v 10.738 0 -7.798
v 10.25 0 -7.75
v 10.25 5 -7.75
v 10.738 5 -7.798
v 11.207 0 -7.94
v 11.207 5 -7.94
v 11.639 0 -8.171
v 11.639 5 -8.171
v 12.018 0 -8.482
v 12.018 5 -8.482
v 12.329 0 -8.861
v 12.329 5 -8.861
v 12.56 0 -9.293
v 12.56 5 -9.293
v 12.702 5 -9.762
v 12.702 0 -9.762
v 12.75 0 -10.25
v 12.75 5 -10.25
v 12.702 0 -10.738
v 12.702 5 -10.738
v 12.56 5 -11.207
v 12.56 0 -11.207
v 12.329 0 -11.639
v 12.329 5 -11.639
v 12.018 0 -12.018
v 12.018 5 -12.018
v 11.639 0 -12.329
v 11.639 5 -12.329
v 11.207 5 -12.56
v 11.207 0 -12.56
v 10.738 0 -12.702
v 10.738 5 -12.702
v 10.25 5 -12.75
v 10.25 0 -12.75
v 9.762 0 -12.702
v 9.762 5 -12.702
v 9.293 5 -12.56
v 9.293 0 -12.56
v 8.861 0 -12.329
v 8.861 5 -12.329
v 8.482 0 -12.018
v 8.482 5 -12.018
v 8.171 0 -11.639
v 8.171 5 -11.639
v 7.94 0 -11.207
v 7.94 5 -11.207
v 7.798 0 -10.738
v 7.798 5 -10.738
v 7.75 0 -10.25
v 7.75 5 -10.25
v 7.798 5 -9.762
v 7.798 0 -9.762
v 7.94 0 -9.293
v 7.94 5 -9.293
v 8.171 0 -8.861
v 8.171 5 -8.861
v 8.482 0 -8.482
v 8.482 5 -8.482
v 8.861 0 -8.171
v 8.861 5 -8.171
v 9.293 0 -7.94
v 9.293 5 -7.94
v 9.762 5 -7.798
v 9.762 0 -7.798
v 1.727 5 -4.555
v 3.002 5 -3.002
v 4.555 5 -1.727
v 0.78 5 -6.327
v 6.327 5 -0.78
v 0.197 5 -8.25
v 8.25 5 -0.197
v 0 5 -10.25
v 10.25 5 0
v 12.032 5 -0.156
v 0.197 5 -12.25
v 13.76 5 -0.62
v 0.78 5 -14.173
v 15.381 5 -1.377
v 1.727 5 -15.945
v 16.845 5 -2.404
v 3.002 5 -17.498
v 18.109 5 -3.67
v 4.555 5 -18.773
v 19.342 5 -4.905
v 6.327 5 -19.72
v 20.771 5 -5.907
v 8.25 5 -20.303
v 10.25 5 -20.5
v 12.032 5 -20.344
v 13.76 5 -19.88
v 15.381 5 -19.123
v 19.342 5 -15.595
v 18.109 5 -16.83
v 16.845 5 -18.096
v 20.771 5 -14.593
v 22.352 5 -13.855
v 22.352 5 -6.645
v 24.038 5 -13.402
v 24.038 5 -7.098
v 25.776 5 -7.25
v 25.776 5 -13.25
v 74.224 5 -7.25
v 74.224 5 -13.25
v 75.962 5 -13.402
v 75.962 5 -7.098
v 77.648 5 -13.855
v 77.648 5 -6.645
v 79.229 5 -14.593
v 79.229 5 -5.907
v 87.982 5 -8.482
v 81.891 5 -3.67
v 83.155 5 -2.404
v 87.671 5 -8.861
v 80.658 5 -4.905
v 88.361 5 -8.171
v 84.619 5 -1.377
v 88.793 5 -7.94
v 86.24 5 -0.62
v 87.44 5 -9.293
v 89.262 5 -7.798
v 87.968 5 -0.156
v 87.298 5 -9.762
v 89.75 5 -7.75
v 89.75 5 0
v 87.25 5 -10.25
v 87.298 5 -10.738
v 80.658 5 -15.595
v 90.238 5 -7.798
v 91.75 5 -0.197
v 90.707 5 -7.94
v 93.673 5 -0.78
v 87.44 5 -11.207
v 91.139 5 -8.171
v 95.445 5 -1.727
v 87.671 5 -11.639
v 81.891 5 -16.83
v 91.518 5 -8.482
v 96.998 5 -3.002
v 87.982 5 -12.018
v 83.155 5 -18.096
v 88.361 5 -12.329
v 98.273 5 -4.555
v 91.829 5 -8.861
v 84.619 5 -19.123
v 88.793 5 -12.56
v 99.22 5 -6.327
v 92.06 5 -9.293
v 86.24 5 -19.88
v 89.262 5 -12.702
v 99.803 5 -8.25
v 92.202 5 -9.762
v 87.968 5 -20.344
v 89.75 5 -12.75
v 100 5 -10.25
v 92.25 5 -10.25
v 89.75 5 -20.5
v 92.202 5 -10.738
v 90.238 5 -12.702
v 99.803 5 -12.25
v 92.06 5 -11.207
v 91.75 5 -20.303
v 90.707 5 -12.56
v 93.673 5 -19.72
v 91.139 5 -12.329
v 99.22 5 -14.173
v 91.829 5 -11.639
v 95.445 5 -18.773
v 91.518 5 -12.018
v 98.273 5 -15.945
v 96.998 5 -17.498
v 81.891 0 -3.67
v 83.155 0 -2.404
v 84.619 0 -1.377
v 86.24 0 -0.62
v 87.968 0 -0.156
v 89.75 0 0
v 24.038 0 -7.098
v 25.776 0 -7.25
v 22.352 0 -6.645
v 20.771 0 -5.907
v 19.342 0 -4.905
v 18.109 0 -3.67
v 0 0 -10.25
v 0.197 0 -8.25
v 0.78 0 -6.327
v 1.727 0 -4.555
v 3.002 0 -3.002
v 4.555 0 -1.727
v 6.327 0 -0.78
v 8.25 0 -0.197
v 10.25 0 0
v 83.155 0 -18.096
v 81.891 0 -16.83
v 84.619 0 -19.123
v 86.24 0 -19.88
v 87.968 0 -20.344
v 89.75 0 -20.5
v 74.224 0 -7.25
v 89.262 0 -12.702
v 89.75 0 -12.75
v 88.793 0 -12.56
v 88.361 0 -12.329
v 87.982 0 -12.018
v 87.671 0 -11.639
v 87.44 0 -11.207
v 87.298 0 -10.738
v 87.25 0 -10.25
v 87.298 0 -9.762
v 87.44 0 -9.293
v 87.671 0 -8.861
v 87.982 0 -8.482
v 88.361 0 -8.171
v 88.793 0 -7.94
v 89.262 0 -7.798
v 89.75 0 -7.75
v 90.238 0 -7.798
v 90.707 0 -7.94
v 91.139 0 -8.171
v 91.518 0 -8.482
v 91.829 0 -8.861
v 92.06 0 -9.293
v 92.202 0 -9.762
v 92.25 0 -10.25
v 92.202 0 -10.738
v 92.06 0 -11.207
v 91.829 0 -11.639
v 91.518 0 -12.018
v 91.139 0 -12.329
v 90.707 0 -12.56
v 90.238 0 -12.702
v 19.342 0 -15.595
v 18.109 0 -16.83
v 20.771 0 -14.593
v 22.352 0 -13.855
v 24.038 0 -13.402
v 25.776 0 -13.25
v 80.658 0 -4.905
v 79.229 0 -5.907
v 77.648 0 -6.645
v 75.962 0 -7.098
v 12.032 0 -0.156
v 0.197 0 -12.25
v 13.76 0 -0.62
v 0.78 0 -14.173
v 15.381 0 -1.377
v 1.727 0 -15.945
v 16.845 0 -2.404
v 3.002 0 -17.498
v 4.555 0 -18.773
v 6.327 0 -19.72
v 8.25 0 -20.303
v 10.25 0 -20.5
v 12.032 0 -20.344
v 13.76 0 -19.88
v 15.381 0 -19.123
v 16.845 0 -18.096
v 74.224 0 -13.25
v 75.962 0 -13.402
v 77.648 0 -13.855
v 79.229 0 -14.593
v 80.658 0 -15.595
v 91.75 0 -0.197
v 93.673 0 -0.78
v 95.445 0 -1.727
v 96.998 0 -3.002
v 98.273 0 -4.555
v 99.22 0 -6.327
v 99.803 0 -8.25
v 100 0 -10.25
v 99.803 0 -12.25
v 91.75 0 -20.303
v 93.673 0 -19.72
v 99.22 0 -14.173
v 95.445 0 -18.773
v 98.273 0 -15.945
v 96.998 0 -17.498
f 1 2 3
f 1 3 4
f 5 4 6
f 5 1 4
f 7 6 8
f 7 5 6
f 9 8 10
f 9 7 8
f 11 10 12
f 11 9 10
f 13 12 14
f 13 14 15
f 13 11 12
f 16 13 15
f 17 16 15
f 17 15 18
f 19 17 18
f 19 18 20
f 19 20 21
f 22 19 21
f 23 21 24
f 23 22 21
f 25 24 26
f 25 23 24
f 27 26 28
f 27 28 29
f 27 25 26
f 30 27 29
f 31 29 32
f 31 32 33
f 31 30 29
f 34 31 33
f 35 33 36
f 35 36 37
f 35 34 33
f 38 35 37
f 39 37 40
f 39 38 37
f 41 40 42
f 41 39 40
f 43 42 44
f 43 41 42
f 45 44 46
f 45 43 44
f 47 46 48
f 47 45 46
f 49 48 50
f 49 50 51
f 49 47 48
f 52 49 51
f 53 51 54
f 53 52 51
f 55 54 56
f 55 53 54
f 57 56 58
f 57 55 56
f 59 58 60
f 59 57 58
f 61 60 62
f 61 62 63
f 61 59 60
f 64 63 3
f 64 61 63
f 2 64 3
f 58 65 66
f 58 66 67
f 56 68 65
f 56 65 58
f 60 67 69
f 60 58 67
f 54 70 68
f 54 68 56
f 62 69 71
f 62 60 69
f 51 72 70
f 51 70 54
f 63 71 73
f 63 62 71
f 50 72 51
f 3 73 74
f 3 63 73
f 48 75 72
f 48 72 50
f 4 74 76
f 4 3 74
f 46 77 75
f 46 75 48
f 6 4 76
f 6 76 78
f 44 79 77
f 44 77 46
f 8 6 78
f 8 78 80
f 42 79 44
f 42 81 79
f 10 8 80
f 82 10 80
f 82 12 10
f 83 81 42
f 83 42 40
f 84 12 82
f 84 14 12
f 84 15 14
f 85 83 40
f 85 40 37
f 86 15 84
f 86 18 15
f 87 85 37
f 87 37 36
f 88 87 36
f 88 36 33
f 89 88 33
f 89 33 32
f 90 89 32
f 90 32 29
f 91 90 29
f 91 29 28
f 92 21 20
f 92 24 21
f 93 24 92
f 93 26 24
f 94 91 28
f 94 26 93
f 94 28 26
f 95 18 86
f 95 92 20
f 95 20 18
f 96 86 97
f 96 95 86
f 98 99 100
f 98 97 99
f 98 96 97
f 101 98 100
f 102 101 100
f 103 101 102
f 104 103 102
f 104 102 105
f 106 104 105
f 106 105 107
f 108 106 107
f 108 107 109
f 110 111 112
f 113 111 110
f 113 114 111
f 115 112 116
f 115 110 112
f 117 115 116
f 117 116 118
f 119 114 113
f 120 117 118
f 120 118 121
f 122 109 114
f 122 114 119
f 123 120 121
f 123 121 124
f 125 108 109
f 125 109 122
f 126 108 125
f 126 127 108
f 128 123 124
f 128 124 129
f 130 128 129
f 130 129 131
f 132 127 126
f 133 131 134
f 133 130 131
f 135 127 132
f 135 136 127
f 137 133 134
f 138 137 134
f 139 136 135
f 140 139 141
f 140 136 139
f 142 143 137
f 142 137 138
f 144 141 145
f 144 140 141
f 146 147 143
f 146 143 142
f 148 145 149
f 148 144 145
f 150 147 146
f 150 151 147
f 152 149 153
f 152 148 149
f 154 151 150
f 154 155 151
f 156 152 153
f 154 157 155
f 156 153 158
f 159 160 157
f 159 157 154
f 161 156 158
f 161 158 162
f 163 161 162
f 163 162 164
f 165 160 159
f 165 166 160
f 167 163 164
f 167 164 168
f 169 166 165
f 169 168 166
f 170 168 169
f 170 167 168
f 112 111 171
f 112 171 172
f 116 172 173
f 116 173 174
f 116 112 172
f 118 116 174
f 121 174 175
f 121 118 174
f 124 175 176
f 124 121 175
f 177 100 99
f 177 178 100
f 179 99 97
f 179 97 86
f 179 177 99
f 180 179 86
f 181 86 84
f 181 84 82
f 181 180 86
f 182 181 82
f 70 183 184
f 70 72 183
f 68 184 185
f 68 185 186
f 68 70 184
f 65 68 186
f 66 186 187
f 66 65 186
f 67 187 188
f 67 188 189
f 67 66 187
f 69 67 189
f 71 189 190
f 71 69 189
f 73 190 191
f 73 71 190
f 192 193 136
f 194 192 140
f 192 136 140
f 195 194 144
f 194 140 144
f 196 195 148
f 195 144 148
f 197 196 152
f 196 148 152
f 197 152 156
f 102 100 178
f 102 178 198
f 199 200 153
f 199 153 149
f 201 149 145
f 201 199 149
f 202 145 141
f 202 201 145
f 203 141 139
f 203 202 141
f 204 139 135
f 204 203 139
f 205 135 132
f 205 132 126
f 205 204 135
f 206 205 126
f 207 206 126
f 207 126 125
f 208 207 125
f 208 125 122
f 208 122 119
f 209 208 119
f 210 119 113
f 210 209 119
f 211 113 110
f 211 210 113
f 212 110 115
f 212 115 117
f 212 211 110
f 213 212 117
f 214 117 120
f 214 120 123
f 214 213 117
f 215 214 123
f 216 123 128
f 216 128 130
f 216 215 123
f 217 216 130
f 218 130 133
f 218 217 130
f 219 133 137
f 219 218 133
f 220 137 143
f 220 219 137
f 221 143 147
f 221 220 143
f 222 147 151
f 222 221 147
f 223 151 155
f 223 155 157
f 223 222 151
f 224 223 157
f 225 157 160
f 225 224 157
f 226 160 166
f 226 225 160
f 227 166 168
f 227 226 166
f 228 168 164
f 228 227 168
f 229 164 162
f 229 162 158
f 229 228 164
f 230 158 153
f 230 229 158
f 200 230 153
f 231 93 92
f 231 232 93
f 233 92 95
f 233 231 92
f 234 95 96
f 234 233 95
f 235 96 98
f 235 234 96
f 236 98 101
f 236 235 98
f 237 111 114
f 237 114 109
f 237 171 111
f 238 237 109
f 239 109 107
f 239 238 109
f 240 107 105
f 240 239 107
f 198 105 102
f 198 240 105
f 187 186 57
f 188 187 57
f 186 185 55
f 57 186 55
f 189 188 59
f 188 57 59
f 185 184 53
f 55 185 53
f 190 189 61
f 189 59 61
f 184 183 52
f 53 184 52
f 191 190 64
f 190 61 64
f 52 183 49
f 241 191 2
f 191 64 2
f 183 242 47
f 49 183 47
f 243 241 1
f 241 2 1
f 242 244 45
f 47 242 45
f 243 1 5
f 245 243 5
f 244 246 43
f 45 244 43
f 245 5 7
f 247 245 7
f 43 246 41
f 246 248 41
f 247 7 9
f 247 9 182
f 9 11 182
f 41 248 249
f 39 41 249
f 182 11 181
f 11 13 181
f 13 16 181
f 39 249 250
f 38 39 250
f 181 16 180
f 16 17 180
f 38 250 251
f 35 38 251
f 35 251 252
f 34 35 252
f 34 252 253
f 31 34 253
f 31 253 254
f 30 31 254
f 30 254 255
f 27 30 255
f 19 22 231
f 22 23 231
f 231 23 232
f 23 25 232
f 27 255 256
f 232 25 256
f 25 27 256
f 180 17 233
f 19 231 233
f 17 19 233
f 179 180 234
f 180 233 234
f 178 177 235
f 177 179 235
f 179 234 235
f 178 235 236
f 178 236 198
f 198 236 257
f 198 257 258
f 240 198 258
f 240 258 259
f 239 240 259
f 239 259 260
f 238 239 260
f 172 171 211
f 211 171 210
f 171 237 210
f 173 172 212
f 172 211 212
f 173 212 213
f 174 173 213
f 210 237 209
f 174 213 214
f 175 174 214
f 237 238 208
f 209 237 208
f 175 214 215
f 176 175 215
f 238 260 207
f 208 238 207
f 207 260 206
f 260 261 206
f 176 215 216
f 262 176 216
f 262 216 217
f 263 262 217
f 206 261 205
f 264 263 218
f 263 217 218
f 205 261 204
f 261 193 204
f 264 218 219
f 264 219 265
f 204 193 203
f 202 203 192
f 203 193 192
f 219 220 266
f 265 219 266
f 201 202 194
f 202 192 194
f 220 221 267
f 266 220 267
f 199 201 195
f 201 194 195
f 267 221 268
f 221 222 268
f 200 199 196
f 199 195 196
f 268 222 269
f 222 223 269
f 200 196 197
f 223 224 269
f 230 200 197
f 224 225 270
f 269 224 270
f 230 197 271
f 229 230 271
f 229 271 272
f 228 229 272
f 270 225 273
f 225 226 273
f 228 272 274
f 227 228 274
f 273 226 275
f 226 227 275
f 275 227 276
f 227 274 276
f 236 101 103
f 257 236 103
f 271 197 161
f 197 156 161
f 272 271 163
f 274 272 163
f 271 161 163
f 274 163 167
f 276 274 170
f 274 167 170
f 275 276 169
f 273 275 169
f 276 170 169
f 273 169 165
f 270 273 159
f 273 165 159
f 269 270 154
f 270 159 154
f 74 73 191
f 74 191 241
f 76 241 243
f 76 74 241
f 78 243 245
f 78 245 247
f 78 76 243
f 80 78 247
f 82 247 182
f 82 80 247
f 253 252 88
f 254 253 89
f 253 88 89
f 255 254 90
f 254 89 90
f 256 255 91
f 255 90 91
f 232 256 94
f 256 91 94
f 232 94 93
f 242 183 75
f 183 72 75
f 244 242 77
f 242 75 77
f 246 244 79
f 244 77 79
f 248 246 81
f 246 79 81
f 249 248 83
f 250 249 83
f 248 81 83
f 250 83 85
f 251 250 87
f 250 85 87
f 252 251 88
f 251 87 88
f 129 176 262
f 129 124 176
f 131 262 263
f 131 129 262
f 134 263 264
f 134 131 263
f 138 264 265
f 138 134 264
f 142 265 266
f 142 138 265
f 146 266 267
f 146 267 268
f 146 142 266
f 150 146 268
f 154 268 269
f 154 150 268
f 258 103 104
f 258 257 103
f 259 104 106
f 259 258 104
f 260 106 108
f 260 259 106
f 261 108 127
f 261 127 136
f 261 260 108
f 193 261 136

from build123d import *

# Parameters (mm, degrees)
SKETCH1_W           = 100
SKETCH1_H           = 20.5
SKETCH1_R           = 2.5
BOSS_EXTRUDE1_DEPTH = 5
FILLET1_R           = 10.25
CUT_EXTRUDE1_DEPTH  = 10
FILLET2_R           = 10


with BuildPart() as part:
    # Sketch1 → Boss-Extrude1 (new body)
    with BuildSketch(Plane(origin=(0, 0, 0), x_dir=(1, 0, 0), z_dir=(0, 1, 0))):
        with Locations((50, 10.25)):
            Rectangle(SKETCH1_W, SKETCH1_H)
        with Locations(Location((10.25, 10.25, 0), (0, 0, 270))):
            Circle(SKETCH1_R, mode=Mode.SUBTRACT)
        with Locations(Location((89.75, 10.25, 0), (0, 0, 90))):
            Circle(SKETCH1_R, mode=Mode.SUBTRACT)
    extrude(amount=BOSS_EXTRUDE1_DEPTH)

    # Fillet1
    fillet1_edges = [part.edges().sort_by_distance(p)[0] for p in [
        (0, 2.5, 0),
        (0, 2.5, -20.5),
        (100, 2.5, -20.5),
        (100, 2.5, 0),
    ]]
    fillet(fillet1_edges, radius=FILLET1_R - 0.0001)  # a hair under: the kernel refuses the full size

    # Sketch2 → Cut-Extrude1 (cut)
    with BuildSketch(Plane(origin=(0, 5, 0), x_dir=(1, 0, 0), z_dir=(0, 1, 0))):
        with BuildLine():
            Line((20.051147892, 13.25), (79.948852108, 13.25))
            ThreePointArc((79.948852108, 13.25), (83.65440733, 18.490524862), (89.75, 20.5))
            Line((89.75, 20.5), (10.25, 20.5))
            ThreePointArc((10.25, 20.5), (16.34559267, 18.490524862), (20.051147892, 13.25))
        make_face()
        with BuildLine():
            Line((20.051147892, 7.25), (79.948852108, 7.25))
            ThreePointArc((79.948852108, 7.25), (83.65440733, 2.009475138), (89.75, 0))
            Line((89.75, 0), (10.25, 0))
            ThreePointArc((10.25, 0), (16.34559267, 2.009475138), (20.051147892, 7.25))
        make_face()
    extrude(amount=-CUT_EXTRUDE1_DEPTH, mode=Mode.SUBTRACT)

    # Fillet2
    fillet2_edges = [part.edges().sort_by_distance(p)[0] for p in [
        (20.051147892, 2.5, -13.25),
        (79.948852108, 2.5, -13.25),
        (79.948852108, 2.5, -7.25),
        (20.051147892, 2.5, -7.25),
    ]]
    fillet(fillet2_edges, radius=FILLET2_R)


solid = part.part
